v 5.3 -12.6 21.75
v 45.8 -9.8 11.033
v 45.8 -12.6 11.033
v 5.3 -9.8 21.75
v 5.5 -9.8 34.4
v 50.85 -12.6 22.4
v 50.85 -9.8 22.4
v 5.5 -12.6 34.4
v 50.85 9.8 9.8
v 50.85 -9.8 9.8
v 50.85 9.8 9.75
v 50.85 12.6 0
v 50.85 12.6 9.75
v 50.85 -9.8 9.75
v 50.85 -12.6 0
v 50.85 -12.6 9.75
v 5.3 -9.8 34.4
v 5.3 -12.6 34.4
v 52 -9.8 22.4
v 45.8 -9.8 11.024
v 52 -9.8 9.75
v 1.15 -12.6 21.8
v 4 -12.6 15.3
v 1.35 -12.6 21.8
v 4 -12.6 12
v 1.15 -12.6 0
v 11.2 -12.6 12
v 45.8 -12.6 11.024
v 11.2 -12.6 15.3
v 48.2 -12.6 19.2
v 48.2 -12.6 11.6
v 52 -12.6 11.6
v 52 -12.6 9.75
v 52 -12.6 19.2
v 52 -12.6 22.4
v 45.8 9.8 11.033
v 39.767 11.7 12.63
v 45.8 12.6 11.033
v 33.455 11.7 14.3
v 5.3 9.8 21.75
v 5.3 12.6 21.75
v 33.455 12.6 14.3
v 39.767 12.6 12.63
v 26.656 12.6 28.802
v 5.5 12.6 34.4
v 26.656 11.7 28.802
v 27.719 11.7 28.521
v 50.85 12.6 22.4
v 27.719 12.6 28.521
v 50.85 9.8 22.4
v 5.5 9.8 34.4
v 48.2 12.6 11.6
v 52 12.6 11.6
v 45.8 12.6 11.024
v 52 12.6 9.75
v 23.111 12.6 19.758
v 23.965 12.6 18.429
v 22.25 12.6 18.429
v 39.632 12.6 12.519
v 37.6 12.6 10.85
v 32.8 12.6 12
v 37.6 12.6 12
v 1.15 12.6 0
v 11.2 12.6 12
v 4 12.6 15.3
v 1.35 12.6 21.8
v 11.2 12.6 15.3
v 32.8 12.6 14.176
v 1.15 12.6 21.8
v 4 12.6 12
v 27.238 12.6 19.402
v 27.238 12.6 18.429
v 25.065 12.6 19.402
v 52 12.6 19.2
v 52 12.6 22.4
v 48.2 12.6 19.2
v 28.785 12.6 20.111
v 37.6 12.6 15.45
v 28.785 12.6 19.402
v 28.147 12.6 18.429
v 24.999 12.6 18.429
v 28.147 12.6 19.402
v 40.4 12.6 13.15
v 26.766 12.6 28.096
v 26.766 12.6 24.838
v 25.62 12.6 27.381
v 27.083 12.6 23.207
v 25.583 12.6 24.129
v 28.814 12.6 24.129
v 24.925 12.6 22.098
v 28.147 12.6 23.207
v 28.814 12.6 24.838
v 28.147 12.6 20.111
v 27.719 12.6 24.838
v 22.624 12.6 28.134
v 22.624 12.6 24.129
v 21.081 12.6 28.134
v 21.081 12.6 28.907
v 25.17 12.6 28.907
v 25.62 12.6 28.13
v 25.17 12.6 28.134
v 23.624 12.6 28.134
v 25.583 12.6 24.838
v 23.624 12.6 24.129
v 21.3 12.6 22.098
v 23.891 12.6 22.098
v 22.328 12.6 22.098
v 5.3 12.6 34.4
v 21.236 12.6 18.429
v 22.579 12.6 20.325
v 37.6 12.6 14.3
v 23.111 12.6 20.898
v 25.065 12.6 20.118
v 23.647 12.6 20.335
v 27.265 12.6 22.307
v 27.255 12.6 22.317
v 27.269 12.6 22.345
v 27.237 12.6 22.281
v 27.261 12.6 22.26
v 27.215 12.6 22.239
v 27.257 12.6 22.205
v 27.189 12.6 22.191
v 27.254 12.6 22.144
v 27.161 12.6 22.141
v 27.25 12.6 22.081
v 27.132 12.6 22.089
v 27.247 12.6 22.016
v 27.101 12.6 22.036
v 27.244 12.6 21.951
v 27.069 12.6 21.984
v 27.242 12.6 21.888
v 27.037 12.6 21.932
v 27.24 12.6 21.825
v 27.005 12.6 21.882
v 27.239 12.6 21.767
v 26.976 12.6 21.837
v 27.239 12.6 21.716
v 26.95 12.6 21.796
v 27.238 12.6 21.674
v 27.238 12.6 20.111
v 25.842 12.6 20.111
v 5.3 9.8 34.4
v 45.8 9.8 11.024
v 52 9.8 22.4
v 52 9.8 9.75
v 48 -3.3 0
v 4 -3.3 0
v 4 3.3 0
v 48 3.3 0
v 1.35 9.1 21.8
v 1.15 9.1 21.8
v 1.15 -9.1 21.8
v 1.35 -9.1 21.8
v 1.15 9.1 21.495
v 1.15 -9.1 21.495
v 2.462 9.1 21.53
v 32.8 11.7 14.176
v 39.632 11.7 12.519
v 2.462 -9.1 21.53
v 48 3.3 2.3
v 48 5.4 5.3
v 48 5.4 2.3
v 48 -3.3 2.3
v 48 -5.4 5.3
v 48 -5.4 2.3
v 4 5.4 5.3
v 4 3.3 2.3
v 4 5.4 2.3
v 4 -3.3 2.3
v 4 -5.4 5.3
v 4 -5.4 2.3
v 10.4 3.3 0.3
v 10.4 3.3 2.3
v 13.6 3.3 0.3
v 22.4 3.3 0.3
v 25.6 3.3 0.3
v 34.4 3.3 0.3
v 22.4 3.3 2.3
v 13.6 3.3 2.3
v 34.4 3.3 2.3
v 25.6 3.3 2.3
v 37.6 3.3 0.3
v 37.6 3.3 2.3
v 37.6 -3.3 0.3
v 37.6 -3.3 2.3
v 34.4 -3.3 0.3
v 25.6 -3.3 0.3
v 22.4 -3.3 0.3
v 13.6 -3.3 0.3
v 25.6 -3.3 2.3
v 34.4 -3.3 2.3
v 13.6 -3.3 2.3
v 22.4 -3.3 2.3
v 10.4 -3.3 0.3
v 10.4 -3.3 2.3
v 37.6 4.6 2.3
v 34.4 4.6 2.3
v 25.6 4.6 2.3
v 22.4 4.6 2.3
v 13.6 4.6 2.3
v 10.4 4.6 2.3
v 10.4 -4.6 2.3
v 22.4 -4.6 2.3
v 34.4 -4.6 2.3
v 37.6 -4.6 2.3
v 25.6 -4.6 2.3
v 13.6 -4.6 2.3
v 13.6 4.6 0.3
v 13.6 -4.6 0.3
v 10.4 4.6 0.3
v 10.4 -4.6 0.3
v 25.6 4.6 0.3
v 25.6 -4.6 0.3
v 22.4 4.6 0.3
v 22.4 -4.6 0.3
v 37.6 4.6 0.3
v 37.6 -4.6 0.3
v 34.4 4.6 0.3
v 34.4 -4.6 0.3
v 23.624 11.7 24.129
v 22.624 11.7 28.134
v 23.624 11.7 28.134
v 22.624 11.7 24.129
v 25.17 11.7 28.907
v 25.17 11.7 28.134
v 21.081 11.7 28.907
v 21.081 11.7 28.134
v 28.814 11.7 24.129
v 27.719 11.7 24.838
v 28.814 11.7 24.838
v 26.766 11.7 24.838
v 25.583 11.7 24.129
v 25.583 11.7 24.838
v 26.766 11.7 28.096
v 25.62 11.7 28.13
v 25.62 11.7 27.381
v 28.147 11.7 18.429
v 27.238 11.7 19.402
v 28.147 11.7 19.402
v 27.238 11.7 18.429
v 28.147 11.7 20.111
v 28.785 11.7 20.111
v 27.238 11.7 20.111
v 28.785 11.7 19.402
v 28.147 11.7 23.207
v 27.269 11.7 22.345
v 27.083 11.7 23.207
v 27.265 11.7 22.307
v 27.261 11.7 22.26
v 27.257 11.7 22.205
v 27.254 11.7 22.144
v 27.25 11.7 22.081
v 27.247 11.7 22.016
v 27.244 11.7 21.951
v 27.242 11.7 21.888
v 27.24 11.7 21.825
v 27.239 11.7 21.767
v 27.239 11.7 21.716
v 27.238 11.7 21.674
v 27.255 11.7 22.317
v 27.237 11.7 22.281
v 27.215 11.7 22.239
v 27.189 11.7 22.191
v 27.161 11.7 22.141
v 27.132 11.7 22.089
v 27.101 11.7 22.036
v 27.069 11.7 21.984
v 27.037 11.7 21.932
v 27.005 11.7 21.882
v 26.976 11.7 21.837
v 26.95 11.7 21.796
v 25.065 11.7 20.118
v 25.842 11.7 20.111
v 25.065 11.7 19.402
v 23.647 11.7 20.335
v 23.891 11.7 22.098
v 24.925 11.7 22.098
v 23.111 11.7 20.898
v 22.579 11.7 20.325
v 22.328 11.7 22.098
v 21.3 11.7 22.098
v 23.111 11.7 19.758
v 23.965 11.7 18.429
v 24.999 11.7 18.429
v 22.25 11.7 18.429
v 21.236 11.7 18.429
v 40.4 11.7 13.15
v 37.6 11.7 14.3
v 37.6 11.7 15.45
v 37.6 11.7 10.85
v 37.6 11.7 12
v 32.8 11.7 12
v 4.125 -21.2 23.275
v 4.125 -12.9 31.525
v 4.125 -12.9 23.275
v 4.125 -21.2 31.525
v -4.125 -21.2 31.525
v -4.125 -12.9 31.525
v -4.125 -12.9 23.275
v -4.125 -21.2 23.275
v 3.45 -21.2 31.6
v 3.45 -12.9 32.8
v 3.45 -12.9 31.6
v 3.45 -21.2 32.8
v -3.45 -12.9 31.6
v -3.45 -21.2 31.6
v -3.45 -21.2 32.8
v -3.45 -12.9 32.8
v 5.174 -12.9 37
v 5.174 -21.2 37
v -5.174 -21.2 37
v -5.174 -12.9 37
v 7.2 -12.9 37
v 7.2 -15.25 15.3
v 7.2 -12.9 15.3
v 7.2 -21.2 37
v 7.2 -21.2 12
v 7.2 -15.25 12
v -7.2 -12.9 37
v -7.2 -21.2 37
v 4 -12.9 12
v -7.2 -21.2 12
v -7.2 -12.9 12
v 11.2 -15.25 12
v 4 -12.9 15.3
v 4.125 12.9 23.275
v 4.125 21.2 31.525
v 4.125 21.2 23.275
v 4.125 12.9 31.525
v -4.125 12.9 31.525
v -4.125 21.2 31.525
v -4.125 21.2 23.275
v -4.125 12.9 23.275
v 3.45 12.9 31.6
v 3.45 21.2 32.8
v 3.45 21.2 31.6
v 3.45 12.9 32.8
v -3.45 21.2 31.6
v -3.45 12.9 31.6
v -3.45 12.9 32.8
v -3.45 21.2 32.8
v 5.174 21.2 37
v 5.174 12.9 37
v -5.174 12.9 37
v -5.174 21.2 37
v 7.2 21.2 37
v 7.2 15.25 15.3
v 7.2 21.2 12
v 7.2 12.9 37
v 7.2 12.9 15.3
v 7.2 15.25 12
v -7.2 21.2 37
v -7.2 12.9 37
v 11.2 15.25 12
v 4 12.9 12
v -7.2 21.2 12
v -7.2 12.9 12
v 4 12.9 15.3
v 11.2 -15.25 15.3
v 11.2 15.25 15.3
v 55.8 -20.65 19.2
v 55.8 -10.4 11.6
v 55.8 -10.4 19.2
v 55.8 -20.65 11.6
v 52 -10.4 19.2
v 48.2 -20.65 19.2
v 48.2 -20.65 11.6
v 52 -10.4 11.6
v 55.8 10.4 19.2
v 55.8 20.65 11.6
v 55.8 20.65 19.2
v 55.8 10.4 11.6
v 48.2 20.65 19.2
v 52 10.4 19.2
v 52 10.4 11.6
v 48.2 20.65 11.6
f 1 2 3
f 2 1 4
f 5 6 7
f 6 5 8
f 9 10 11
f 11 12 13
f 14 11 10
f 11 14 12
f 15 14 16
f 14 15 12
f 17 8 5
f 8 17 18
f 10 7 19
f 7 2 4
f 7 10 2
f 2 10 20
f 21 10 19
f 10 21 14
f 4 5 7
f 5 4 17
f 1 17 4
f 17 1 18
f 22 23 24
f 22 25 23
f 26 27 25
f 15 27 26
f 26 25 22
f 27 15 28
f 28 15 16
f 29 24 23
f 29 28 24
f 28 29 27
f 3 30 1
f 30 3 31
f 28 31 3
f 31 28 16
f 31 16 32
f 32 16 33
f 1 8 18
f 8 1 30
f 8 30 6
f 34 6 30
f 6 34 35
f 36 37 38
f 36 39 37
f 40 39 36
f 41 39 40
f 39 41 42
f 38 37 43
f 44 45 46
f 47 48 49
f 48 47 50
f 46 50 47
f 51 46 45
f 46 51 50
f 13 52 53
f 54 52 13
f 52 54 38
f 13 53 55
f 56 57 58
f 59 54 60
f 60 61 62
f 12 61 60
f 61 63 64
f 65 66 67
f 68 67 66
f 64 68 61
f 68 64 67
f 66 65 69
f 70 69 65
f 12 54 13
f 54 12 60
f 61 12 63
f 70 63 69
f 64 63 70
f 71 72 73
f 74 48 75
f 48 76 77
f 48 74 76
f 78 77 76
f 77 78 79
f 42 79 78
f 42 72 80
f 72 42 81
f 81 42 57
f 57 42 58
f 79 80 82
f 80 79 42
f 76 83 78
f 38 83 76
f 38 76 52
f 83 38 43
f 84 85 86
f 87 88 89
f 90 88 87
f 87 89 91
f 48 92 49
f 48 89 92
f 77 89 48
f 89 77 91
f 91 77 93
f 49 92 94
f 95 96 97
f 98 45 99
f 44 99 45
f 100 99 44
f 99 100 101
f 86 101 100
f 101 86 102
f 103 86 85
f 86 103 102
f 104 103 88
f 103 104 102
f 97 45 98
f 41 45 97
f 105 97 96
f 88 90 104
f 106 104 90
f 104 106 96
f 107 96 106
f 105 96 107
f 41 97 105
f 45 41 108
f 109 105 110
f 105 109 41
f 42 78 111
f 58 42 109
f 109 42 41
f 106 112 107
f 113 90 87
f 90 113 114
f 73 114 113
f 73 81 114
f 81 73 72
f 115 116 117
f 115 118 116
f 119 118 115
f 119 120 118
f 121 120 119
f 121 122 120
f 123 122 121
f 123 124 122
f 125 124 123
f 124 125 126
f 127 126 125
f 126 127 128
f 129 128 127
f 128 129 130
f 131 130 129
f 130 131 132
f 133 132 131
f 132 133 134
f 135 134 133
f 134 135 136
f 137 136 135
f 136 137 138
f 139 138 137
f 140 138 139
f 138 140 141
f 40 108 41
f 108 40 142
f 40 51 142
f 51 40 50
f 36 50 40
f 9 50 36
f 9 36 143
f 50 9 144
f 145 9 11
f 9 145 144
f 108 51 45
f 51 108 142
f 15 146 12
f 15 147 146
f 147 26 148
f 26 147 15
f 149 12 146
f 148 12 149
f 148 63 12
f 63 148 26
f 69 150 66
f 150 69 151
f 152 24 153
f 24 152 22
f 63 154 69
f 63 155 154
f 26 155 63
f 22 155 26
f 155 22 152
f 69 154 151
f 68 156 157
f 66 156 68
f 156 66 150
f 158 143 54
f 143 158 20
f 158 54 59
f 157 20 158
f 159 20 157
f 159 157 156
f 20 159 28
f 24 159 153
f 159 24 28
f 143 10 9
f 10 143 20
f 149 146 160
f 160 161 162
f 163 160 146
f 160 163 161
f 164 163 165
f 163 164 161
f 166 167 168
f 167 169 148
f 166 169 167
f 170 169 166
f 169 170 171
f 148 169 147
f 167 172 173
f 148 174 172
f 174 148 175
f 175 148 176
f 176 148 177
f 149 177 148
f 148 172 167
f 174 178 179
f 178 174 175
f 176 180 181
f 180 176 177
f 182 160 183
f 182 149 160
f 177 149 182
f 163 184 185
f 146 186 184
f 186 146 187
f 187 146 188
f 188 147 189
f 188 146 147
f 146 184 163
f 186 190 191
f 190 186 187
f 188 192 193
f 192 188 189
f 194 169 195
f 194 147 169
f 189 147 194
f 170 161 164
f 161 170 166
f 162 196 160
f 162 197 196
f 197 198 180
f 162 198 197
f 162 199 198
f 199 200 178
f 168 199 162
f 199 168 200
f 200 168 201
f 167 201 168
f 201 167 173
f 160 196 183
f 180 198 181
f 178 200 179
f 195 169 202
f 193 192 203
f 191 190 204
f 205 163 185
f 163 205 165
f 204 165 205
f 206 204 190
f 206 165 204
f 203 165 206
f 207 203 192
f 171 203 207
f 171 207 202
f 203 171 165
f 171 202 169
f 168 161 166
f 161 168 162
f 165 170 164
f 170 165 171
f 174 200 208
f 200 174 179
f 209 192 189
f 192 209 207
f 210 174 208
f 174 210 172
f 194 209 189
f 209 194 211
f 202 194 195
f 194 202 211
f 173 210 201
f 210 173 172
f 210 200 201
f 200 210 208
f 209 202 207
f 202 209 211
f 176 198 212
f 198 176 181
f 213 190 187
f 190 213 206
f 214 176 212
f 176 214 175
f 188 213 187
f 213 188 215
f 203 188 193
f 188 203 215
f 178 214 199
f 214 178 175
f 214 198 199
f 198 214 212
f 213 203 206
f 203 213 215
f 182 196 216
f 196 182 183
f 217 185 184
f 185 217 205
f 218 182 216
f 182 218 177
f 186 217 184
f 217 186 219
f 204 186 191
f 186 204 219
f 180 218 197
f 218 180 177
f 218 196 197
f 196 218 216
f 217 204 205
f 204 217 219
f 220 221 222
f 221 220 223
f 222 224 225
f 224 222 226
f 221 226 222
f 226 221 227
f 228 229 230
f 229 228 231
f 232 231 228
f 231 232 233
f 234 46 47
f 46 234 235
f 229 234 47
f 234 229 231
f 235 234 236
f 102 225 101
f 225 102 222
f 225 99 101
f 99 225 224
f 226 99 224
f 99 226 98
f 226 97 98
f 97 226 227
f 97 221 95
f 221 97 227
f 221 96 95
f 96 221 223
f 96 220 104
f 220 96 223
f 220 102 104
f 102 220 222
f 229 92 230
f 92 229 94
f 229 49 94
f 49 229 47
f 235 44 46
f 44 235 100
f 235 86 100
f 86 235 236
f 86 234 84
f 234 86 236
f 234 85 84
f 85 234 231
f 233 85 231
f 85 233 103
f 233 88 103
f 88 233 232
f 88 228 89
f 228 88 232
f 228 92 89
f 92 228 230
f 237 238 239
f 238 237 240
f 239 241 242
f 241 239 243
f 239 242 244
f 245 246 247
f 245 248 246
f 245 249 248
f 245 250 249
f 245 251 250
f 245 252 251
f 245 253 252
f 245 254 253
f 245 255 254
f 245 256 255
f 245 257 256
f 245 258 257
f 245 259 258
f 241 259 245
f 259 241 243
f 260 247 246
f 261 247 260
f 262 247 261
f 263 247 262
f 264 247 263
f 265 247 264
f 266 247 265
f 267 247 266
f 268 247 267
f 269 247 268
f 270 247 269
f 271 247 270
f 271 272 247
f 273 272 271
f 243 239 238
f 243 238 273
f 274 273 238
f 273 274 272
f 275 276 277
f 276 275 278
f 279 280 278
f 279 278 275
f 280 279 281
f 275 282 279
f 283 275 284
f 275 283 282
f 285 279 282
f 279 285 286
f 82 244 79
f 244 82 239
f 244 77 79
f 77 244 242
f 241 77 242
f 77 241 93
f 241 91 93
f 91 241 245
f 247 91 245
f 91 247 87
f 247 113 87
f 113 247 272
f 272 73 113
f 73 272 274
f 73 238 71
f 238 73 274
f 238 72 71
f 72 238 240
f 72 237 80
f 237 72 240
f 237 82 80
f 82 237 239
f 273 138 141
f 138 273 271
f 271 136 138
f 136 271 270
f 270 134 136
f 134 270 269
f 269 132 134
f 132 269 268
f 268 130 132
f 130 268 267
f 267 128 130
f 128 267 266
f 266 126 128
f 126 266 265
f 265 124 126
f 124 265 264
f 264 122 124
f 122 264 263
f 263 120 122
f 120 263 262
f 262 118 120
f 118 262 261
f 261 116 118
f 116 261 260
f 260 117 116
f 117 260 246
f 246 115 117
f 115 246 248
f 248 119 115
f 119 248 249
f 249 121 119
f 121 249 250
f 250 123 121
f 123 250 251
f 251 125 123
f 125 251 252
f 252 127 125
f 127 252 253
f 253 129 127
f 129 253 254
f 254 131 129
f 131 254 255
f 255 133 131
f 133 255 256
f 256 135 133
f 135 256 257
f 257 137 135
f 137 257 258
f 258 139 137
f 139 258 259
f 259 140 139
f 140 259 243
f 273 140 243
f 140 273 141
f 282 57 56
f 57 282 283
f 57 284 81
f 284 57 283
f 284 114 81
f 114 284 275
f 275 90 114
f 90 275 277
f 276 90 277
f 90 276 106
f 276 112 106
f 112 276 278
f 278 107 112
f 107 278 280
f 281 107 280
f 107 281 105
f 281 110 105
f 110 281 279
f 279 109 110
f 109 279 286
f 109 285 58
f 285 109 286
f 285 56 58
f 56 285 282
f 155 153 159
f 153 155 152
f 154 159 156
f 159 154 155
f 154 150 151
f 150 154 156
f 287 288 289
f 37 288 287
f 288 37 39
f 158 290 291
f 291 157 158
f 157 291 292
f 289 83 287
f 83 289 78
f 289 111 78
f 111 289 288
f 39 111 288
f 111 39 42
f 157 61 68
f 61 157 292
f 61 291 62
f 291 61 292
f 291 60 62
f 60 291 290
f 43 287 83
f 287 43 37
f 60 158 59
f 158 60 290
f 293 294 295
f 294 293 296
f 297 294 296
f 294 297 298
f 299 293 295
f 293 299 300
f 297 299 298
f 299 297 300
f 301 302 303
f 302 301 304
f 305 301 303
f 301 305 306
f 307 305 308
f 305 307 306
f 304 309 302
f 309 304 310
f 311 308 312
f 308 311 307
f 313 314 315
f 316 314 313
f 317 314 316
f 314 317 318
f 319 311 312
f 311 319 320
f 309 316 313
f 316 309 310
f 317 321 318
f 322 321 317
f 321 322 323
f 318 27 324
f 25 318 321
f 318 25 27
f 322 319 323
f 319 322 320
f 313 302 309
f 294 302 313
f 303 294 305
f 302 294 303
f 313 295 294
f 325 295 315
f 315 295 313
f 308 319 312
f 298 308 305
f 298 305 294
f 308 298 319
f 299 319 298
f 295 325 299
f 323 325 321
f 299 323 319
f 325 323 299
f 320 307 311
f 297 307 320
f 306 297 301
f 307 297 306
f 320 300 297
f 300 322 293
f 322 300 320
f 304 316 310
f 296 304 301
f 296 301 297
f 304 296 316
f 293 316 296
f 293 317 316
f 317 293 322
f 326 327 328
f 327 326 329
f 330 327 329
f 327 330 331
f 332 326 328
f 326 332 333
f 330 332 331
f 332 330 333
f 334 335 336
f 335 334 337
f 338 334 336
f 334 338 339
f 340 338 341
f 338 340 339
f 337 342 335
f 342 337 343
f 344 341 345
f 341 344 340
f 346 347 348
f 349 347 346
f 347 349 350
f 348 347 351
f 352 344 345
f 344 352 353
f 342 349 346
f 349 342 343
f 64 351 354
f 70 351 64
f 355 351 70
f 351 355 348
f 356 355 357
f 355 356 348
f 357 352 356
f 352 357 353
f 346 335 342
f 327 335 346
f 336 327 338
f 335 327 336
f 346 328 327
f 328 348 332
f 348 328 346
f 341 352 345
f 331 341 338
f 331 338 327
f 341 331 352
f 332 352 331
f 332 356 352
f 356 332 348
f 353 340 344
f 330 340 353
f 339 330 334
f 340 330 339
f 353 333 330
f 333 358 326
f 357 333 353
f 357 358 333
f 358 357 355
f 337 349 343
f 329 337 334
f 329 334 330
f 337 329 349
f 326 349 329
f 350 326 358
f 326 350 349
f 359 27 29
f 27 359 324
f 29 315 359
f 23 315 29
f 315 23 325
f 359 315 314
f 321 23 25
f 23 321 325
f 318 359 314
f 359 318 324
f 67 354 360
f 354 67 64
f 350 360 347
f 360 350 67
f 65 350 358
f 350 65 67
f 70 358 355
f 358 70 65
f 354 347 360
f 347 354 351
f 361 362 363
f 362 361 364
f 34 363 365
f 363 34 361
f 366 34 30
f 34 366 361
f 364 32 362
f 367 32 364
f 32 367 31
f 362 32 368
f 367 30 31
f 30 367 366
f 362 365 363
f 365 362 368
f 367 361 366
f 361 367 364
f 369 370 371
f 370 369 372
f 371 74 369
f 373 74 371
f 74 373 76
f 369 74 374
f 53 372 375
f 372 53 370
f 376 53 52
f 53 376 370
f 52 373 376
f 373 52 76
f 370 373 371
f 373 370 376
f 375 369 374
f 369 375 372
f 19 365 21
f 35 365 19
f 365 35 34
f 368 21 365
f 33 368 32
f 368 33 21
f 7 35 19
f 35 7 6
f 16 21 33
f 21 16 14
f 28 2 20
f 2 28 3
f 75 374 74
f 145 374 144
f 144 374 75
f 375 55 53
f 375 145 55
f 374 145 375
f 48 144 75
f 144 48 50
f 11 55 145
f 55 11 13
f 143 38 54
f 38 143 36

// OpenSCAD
// Parametric marble-run kit
// Nominal ball: 16 mm glass marble or 5/8 in (15.875 mm) steel bearing.
// Open this file in OpenSCAD and set `part`, or pass -D from scripts/build_kit.py.
//
// Print orientation is the model's orientation: channel opens upward, bed is z = 0.
// No supports. 0.4 mm nozzle, 0.2 mm layers, 3 perimeters, 15% infill.

/* [Marble] */
marble_d = 16.0; // [12:0.5:20]

/* [Fit] */
// Extra diameter clearance on snap pockets. Raise by 0.1 if a test joint is tight.
fit_extra = 0.0; // [-0.2:0.05:0.6]

/* [Export] */
part = "T1";
mark_qty = 4;
mode = "part"; // [part, fit, mate, section]
mate_angle = 0; // degrees, positive lowers the downstream piece

/* [Hidden] */
$fn = 48;

ch_w = marble_d + 3.6;          // 19.6 at 16 mm
wall = 2.8;
floor_t = 2.6;
keel_h = 7.2;                   // solid base that carries the riser rail
wall_h = 12.6;                  // above the marble floor
outer_w = ch_w + 2 * wall;
floor_top = keel_h + floor_t;   // marble floor at the low (outlet) end

// Square lock. A square bar cannot rotate, so a run cannot sag flat.
bar = 7.6;
bar_pocket = bar + 0.65 + fit_extra;
neck_w = bar - 0.7;
neck_clear = 0.40;
stub_len = 7.6;
stub_gap = 0.45;
cradle_x = 7.2;
end_inset = 1.15;
axle_d = bar;                   // legacy name used by a few clearances
axle_z = floor_top + 5.6;

// Gravity is built into each track: about 12 degrees, in 12 mm steps.
slope_deg = 12;
drop_step = 12;

// Riser rail under every channel. Head slides in from the end and clicks.
slot_mouth_w = 6.6;
slot_mouth_h = 2.6;
slot_cav_w = 10.8;
slot_cav_z = 2.3;
slot_cav_h = 3.0;
head_w = 10.0;
head_h = 2.6;
head_len = 8.0;
neck_bar_w = 5.6;
riser_pitch = 12;

joint_gap = 1.15;               // floor-to-floor gap when level
// Downstream floor is slightly lower so a mismatch is always a step down.
step_down = 0.25;

module __end_params() {}

// ---------- small utilities ----------

module rz(a) { rotate([0, 0, a]) children(); }

module text_line(s, size=5.5) {
    text(s, size=size, font="Liberation Sans:style=Bold",
         halign="center", valign="center", $fn=16);
}

// Recessed label on the +Y outer wall. x is along-track position.
module side_label(x, lines, size=5.2) {
    n = len(lines);
    for (i = [0:n - 1]) {
        zi = floor_top + wall_h * 0.62 - (i - (n - 1) / 2) * (size + 0.7);
        translate([x, outer_w / 2 + 0.15, zi])
            rotate([90, 0, 0])
                linear_extrude(height=1.05, convexity=4)
                    text_line(lines[i], size);
    }
}

// Flow arrow on the +Y wall, pointing +X (toward the outlet).
module side_arrow(x) {
    translate([x, outer_w / 2 + 0.15, floor_top + 2.2])
        rotate([90, 0, 0])
            linear_extrude(height=1.05, convexity=3)
                polygon(points=[[-3.2, 0], [1.6, 0], [1.6, -1.15], [4.4, 1.15],
                                [1.6, 3.45], [1.6, 2.3], [-3.2, 2.3]]);
}

function qty_lines(id, qty, with_qty=true) =
    with_qty ? [id, str("x", qty)] : [id];

function track_drop(len) =
    drop_step * max(1, round(len * tan(slope_deg) / drop_step));

function pz(p) = len(p) > 2 ? p[2] : 0;

// ---------- hinge ----------
// Hinge axis is parallel to Y.
// Male axle stubs live on the upstream OUT end.
// Female keyhole cradles live on the downstream IN end.
// Seated axle does not rub: the neck is above the crown and only interferes while snapping in.

function side_y(s, extra=0) = s * (outer_w / 2 + stub_gap + extra);

module axle_stubs() {
    // Square bar embedded in the side wall. Downstream walls start past it.
    y_root = outer_w / 2 - wall + 0.6;
    y_tip = outer_w / 2 + stub_gap + stub_len;
    for (s = [-1, 1]) {
        ymin = s > 0 ? y_root : -y_tip;
        translate([-bar / 2, ymin, axle_z - bar / 2])
            cube([bar, y_tip - y_root, bar]);
    }
}

module keyhole_cut(length) {
    // Square pocket. The neck is above a seated bar, so it snaps in and then sits free.
    translate([-bar_pocket / 2, -length / 2 - 0.1, -bar_pocket / 2])
        cube([bar_pocket, length + 0.2, bar_pocket]);
    nb = bar / 2 + neck_clear;
    translate([-neck_w / 2, -length / 2 - 0.2, nb])
        cube([neck_w, length + 0.4, 16]);
    hull() {
        translate([-neck_w / 2, -length / 2 - 0.2, nb + 1.2])
            cube([neck_w, length + 0.4, 0.2]);
        translate([-(bar_pocket + 3) / 2, -length / 2 - 0.2, nb + 6.5])
            cube([bar_pocket + 3, length + 0.4, 0.2]);
    }
}

module cradle_block(side) {
    y0 = side_y(side, -0.15);
    y1 = side_y(side, stub_len + 0.55);
    ymin = min(y0, y1);
    ymax = max(y0, y1);
    y_mid = (ymin + ymax) / 2;
    difference() {
        translate([-cradle_x, ymin, 0])
            cube([cradle_x * 2, ymax - ymin, axle_z + axle_d / 2 + neck_clear + 5.4]);
        translate([0, y_mid, axle_z])
            keyhole_cut(ymax - ymin + 0.8);
    }
}

// Low rib under the axle, so it can cross the hinge plane without hitting a stub.
module cradle_tie(side) {
    y_inner = side * (outer_w / 2 - wall - 0.5);
    y_outer = side_y(side, 2.2);
    ymin = min(y_inner, y_outer);
    ymax = max(y_inner, y_outer);
    translate([4.0, ymin, 0])
        cube([7.2, ymax - ymin, 3.3]);
}

// Cut the side walls back so an upstream axle can sit in the cradles.
module axle_clearance() {
    intersection() {
        translate([0, 0, axle_z])
            rotate([-90, 0, 0])
                cylinder(d=axle_d + 2.6, h=outer_w + 30, center=true, $fn=28);
        for (s = [-1, 1]) {
            ypos = s * (outer_w / 2) - (s > 0 ? wall + 1.2 : -1.2);
            translate([-8, min(ypos, ypos + wall + 2.4), 2.2])
                cube([16, wall + 2.4, 20]);
        }
    }
}

module cradles() {
    cradle_block(-1);
    cradle_block(1);
    cradle_tie(-1);
    cradle_tie(1);
}

// Downward-opening T-slot. A riser head slides in from the end.
module t_slot_plain(x0, x1) {
    translate([x0, -slot_mouth_w / 2, -0.3])
        cube([max(x1 - x0, 0.2), slot_mouth_w, slot_mouth_h + 0.3]);
    translate([x0, -slot_cav_w / 2, slot_cav_z])
        cube([max(x1 - x0, 0.2), slot_cav_w, slot_cav_h]);
}

module t_slot(x0, x1) {
    t_slot_plain(x0, x1);
    // Wider pockets the riser nub clicks into, one per riser_pitch.
    for (x = [x0 + 8:riser_pitch:x1 - 4])
        translate([x - 1.6, -(slot_mouth_w / 2 + 1.3), 0.3])
            cube([3.2, slot_mouth_w + 2.6, slot_mouth_h]);
}

// Remove only the underside corner of the inlet floor so the part can pitch down.
module inlet_chamfer_cut() {
    hull() {
        translate([0.4, -6.4, -0.2])
            cube([0.2, 12.8, 2.05]);
        translate([12.0, -6.4, -0.2])
            cube([0.2, 12.8, 0.22]);
    }
}

// ---------- straight channel ----------

module channel_straight(len, fz0, fz1, open_inlet=true) {
    // Floor runs close to the hinge. Inlet walls start past the lock bar
    // so a seated stub does not intersect them. The marble bridges that gap.
    x0 = end_inset;
    x1 = len - end_inset;
    wx0 = open_inlet ? (bar / 2 + 1.5) : end_inset;
    difference() {
        union() {
            hull() {
                translate([x0, -outer_w / 2, 0]) cube([0.2, outer_w, fz0]);
                translate([x1 - 0.2, -outer_w / 2, 0]) cube([0.2, outer_w, fz1]);
            }
            for (s = [-1, 1]) {
                hull() {
                    translate([wx0, s * (outer_w / 2) - (s > 0 ? wall : 0), fz0 - 0.05])
                        cube([0.2, wall, wall_h + 0.05]);
                    translate([x1 - 0.2, s * (outer_w / 2) - (s > 0 ? wall : 0), fz1 - 0.05])
                        cube([0.2, wall, wall_h + 0.05]);
                }
            }
        }
        if (len > 14)
            t_slot(4, len - 4);
    }
}

// Inlet floor is 0.3 mm low, then ramps back up so every joint steps downhill.
module inlet_step_cut(zfloor=floor_top) {
    hull() {
        translate([0.4, -ch_w / 2 + 0.7, zfloor - 0.32])
            cube([0.2, ch_w - 1.4, 0.34]);
        translate([11.5, -ch_w / 2 + 0.7, zfloor - 0.02])
            cube([0.2, ch_w - 1.4, 0.04]);
    }
}

module tube(len, id, qty) {
    d = track_drop(len);
    difference() {
        channel_straight(len, floor_top + d, floor_top);
        inlet_step_cut(floor_top + d);
        translate([0, 0, d / 2])
            side_label(len * 0.48, qty_lines(id, qty), 5.0);
        side_arrow(len - 16);
    }
    translate([0, 0, d]) cradles();
    translate([len, 0, 0]) {
        axle_stubs();
        for (s = [-1, 1])
            translate([-6.2, s * (outer_w / 2) - (s > 0 ? wall : 0), floor_top - 0.05])
                cube([6.2, wall, wall_h + 0.05]);
    }
}

// ---------- swept channel (curves, zigzag, junctions) ----------
// pts are [x,y], angs are heading degrees (0 = +X). Profiles are thin slabs
// hull'ed together. The void slab is slightly longer so it clears the solid hull.

module profile_solid(fz) {
    translate([-0.6, -outer_w / 2, 0])
        cube([1.2, outer_w, fz]);
    for (s = [-1, 1])
        translate([-0.6, s * outer_w / 2 - (s > 0 ? wall : 0), fz - 0.05])
            cube([1.2, wall, wall_h + 0.05]);
}

module profile_void(fz) {
    translate([-1.15, -ch_w / 2, fz - 0.02])
        cube([2.3, ch_w, wall_h + 8]);
}

module sweep(pts, angs, fz) {
    n = len(pts);
    difference() {
        union() {
            for (i = [0:n - 2])
                hull() {
                    translate([pts[i][0], pts[i][1], pz(pts[i])]) rz(angs[i]) profile_solid(fz);
                    translate([pts[i + 1][0], pts[i + 1][1], pz(pts[i + 1])]) rz(angs[i + 1]) profile_solid(fz);
                }
            // Keel down to the bed so the riser rail stays on the bottom.
            for (i = [0:n - 2])
                hull() {
                    translate([pts[i][0], pts[i][1], 0]) rz(angs[i])
                        translate([-0.7, -8, 0]) cube([1.4, 16, keel_h]);
                    translate([pts[i + 1][0], pts[i + 1][1], 0]) rz(angs[i + 1])
                        translate([-0.7, -8, 0]) cube([1.4, 16, keel_h]);
                }
        }
        for (i = [0:n - 2])
            hull() {
                translate([pts[i][0], pts[i][1], pz(pts[i])]) rz(angs[i]) profile_void(fz);
                translate([pts[i + 1][0], pts[i + 1][1], pz(pts[i + 1])]) rz(angs[i + 1]) profile_void(fz);
            }
        for (i = [0:n - 2])
            hull() {
                translate([pts[i][0], pts[i][1], 0]) rz(angs[i])
                    t_slot_plain(-1.3, 1.3);
                translate([pts[i + 1][0], pts[i + 1][1], 0]) rz(angs[i + 1])
                    t_slot_plain(-1.3, 1.3);
            }
    }
}

function arc_pts(cx, cy, r, a0, a1, n=18) =
    [for (i = [0:n]) let(a = a0 + (a1 - a0) * i / n)
        [cx + r * cos(a), cy + r * sin(a)]];

// Heading of travel. Increasing angle (CCW) heads at a+90; clockwise travel heads at a-90.
function arc_angs(a0, a1, n=18) =
    [for (i = [0:n]) let(a = a0 + (a1 - a0) * i / n)
        (a1 >= a0 ? a + 90 : a - 90)];

module hinge_male_at(x, y, ang) {
    translate([x, y, 0]) rz(ang) {
        axle_stubs();
        for (s = [-1, 1])
            translate([-6.2, s * (outer_w / 2) - (s > 0 ? wall : 0), floor_top - 0.05])
                cube([6.2, wall, wall_h + 0.05]);
    }
}

module hinge_female_at(x, y, ang) {
    translate([x, y, 0]) rz(ang)
        cradles();
}

// ---------- curved parts ----------

module curve(hand, id, qty) {
    // Straight leads keep the hinges identical to a tube. hand +1 turns left.
    lead = 16;
    r = 36;
    n = 14;
    a0 = hand > 0 ? -90 : 90;
    a1 = 0;
    cx = lead;
    cy = hand > 0 ? r : -r;
    pts = arc_pts(cx, cy, r, a0, a1, n);
    angs = arc_angs(a0, a1, n);
    pE = pts[len(pts) - 1];
    hE = angs[len(angs) - 1];
    mid = pts[floor(n / 2)];
    hang = angs[floor(n / 2)];
    d = drop_step;
    ptsz = [for (i = [0:len(pts) - 1]) [pts[i][0], pts[i][1], d * (1 - i / (len(pts) - 1))]];
    difference() {
        union() {
            channel_straight(lead + 1.2, floor_top + d, floor_top + d);
            sweep(ptsz, angs, floor_top);
            translate([pE[0], pE[1], 0]) rz(hE)
                translate([-3, 0, 0])
                    channel_straight(lead + 3, floor_top, floor_top, false);
        }
        inlet_step_cut(floor_top + d);
        translate([mid[0], mid[1], d / 2]) rz(hang)
            side_label(0, qty_lines(id, qty), 4.6);
    }
    translate([0, 0, d]) hinge_female_at(0, 0, 0);
    translate([pE[0], pE[1], 0]) rz(hE)
        translate([lead, 0, 0])
            hinge_male_at(0, 0, 0);
}

module uturn(id, qty) {
    lead = 14;
    r = 32;
    n = 20;
    a0 = -90; a1 = 90;
    pts = arc_pts(lead, r, r, a0, a1, n);
    angs = arc_angs(a0, a1, n);
    pE = pts[len(pts) - 1];
    hE = angs[len(angs) - 1];
    mid = pts[floor(n / 2)];
    hang = angs[floor(n / 2)];
    d = drop_step * 2;
    ptsz = [for (i = [0:len(pts) - 1]) [pts[i][0], pts[i][1], d * (1 - i / (len(pts) - 1))]];
    difference() {
        union() {
            channel_straight(lead + 1.2, floor_top + d, floor_top + d);
            sweep(ptsz, angs, floor_top);
            translate([pE[0], pE[1], 0]) rz(hE)
                translate([-3, 0, 0])
                    channel_straight(lead + 3, floor_top, floor_top, false);
        }
        inlet_step_cut(floor_top + d);
        translate([mid[0], mid[1], d / 2]) rz(hang)
            side_label(0, qty_lines(id, qty), 4.6);
    }
    translate([0, 0, d]) hinge_female_at(0, 0, 0);
    translate([pE[0], pE[1], 0]) rz(hE)
        translate([lead, 0, 0])
            hinge_male_at(0, 0, 0);
}

include <parts_extra.scad>

// ---------- dispatcher ----------

module build_part() {
    if (part == "T1") tube(52, "T1", mark_qty);
    else if (part == "T2") tube(100, "T2", mark_qty);
    else if (part == "T3") tube(150, "T3", mark_qty);
    else if (part == "FIT") tube(42, "FIT", 1);
    else if (part == "CL") curve(+1, "CL", mark_qty);
    else if (part == "CR") curve(-1, "CR", mark_qty);
    else if (part == "CU") uturn("CU", mark_qty);
    else if (part == "RS") part_rs();
    else extra_part();
}

module part_rs() {
    // 12 mm locking riser. The head slides into the rail under any channel,
    // and into the slot in the bottom of another riser.
    difference() {
        union() {
            translate([-8, -8, 0]) cube([16, 16, riser_pitch]);
            translate([-head_len / 2, -neck_bar_w / 2, riser_pitch])
                cube([head_len, neck_bar_w, slot_mouth_h]);
            translate([-head_len / 2, -head_w / 2, riser_pitch + slot_mouth_h - 0.05])
                cube([head_len, head_w, head_h]);
            // Nub that clicks into the rail pockets.
            translate([-1.2, -3.7, riser_pitch + 0.5])
                cube([2.4, 7.4, 1.5]);
        }
        t_slot(-9, 9);
        translate([-7, -7.9, 4])
            rotate([90, 0, 0])
                linear_extrude(1.0)
                    text_line("RS", 4.5);
        translate([-6, -7.9, 1.2])
            rotate([90, 0, 0])
                linear_extrude(1.0)
                    text_line(str("x", mark_qty), 3.4);
    }
}

module mated() {
    len = 52;
    d = track_drop(len);
    tube(len, "T1", 4);
    translate([len, 0, axle_z])
        rotate([0, mate_angle, 0])
            translate([0, 0, -(axle_z + d)])
                tube(len, "T1", 4);
}

module mate_hit() {
    len = 52;
    d = track_drop(len);
    intersection() {
        tube(len, "T1", 4);
        translate([len, 0, axle_z])
            rotate([0, mate_angle, 0])
                translate([0, 0, -(axle_z + d)])
                    tube(len, "T1", 4);
    }
}

if (mode == "part") build_part();
else if (mode == "mate") mated();
else if (mode == "hit") mate_hit();
else if (mode == "section")
    intersection() {
        mated();
        translate([-5, -0.4, -2]) cube([120, 0.8, 30]);
    }
else if (mode == "fit") {
    // Spheres that must miss the solid. An empty STL means the channel clears the ball.
    intersection() {
        tube(52, "T1", 4);
        let(d = track_drop(52))
        for (x = [12:6:40])
            translate([x, 0, floor_top + d * (1 - x / 52) + marble_d / 2 + 0.8])
                sphere(d=marble_d, $fn=24);
    }
}
